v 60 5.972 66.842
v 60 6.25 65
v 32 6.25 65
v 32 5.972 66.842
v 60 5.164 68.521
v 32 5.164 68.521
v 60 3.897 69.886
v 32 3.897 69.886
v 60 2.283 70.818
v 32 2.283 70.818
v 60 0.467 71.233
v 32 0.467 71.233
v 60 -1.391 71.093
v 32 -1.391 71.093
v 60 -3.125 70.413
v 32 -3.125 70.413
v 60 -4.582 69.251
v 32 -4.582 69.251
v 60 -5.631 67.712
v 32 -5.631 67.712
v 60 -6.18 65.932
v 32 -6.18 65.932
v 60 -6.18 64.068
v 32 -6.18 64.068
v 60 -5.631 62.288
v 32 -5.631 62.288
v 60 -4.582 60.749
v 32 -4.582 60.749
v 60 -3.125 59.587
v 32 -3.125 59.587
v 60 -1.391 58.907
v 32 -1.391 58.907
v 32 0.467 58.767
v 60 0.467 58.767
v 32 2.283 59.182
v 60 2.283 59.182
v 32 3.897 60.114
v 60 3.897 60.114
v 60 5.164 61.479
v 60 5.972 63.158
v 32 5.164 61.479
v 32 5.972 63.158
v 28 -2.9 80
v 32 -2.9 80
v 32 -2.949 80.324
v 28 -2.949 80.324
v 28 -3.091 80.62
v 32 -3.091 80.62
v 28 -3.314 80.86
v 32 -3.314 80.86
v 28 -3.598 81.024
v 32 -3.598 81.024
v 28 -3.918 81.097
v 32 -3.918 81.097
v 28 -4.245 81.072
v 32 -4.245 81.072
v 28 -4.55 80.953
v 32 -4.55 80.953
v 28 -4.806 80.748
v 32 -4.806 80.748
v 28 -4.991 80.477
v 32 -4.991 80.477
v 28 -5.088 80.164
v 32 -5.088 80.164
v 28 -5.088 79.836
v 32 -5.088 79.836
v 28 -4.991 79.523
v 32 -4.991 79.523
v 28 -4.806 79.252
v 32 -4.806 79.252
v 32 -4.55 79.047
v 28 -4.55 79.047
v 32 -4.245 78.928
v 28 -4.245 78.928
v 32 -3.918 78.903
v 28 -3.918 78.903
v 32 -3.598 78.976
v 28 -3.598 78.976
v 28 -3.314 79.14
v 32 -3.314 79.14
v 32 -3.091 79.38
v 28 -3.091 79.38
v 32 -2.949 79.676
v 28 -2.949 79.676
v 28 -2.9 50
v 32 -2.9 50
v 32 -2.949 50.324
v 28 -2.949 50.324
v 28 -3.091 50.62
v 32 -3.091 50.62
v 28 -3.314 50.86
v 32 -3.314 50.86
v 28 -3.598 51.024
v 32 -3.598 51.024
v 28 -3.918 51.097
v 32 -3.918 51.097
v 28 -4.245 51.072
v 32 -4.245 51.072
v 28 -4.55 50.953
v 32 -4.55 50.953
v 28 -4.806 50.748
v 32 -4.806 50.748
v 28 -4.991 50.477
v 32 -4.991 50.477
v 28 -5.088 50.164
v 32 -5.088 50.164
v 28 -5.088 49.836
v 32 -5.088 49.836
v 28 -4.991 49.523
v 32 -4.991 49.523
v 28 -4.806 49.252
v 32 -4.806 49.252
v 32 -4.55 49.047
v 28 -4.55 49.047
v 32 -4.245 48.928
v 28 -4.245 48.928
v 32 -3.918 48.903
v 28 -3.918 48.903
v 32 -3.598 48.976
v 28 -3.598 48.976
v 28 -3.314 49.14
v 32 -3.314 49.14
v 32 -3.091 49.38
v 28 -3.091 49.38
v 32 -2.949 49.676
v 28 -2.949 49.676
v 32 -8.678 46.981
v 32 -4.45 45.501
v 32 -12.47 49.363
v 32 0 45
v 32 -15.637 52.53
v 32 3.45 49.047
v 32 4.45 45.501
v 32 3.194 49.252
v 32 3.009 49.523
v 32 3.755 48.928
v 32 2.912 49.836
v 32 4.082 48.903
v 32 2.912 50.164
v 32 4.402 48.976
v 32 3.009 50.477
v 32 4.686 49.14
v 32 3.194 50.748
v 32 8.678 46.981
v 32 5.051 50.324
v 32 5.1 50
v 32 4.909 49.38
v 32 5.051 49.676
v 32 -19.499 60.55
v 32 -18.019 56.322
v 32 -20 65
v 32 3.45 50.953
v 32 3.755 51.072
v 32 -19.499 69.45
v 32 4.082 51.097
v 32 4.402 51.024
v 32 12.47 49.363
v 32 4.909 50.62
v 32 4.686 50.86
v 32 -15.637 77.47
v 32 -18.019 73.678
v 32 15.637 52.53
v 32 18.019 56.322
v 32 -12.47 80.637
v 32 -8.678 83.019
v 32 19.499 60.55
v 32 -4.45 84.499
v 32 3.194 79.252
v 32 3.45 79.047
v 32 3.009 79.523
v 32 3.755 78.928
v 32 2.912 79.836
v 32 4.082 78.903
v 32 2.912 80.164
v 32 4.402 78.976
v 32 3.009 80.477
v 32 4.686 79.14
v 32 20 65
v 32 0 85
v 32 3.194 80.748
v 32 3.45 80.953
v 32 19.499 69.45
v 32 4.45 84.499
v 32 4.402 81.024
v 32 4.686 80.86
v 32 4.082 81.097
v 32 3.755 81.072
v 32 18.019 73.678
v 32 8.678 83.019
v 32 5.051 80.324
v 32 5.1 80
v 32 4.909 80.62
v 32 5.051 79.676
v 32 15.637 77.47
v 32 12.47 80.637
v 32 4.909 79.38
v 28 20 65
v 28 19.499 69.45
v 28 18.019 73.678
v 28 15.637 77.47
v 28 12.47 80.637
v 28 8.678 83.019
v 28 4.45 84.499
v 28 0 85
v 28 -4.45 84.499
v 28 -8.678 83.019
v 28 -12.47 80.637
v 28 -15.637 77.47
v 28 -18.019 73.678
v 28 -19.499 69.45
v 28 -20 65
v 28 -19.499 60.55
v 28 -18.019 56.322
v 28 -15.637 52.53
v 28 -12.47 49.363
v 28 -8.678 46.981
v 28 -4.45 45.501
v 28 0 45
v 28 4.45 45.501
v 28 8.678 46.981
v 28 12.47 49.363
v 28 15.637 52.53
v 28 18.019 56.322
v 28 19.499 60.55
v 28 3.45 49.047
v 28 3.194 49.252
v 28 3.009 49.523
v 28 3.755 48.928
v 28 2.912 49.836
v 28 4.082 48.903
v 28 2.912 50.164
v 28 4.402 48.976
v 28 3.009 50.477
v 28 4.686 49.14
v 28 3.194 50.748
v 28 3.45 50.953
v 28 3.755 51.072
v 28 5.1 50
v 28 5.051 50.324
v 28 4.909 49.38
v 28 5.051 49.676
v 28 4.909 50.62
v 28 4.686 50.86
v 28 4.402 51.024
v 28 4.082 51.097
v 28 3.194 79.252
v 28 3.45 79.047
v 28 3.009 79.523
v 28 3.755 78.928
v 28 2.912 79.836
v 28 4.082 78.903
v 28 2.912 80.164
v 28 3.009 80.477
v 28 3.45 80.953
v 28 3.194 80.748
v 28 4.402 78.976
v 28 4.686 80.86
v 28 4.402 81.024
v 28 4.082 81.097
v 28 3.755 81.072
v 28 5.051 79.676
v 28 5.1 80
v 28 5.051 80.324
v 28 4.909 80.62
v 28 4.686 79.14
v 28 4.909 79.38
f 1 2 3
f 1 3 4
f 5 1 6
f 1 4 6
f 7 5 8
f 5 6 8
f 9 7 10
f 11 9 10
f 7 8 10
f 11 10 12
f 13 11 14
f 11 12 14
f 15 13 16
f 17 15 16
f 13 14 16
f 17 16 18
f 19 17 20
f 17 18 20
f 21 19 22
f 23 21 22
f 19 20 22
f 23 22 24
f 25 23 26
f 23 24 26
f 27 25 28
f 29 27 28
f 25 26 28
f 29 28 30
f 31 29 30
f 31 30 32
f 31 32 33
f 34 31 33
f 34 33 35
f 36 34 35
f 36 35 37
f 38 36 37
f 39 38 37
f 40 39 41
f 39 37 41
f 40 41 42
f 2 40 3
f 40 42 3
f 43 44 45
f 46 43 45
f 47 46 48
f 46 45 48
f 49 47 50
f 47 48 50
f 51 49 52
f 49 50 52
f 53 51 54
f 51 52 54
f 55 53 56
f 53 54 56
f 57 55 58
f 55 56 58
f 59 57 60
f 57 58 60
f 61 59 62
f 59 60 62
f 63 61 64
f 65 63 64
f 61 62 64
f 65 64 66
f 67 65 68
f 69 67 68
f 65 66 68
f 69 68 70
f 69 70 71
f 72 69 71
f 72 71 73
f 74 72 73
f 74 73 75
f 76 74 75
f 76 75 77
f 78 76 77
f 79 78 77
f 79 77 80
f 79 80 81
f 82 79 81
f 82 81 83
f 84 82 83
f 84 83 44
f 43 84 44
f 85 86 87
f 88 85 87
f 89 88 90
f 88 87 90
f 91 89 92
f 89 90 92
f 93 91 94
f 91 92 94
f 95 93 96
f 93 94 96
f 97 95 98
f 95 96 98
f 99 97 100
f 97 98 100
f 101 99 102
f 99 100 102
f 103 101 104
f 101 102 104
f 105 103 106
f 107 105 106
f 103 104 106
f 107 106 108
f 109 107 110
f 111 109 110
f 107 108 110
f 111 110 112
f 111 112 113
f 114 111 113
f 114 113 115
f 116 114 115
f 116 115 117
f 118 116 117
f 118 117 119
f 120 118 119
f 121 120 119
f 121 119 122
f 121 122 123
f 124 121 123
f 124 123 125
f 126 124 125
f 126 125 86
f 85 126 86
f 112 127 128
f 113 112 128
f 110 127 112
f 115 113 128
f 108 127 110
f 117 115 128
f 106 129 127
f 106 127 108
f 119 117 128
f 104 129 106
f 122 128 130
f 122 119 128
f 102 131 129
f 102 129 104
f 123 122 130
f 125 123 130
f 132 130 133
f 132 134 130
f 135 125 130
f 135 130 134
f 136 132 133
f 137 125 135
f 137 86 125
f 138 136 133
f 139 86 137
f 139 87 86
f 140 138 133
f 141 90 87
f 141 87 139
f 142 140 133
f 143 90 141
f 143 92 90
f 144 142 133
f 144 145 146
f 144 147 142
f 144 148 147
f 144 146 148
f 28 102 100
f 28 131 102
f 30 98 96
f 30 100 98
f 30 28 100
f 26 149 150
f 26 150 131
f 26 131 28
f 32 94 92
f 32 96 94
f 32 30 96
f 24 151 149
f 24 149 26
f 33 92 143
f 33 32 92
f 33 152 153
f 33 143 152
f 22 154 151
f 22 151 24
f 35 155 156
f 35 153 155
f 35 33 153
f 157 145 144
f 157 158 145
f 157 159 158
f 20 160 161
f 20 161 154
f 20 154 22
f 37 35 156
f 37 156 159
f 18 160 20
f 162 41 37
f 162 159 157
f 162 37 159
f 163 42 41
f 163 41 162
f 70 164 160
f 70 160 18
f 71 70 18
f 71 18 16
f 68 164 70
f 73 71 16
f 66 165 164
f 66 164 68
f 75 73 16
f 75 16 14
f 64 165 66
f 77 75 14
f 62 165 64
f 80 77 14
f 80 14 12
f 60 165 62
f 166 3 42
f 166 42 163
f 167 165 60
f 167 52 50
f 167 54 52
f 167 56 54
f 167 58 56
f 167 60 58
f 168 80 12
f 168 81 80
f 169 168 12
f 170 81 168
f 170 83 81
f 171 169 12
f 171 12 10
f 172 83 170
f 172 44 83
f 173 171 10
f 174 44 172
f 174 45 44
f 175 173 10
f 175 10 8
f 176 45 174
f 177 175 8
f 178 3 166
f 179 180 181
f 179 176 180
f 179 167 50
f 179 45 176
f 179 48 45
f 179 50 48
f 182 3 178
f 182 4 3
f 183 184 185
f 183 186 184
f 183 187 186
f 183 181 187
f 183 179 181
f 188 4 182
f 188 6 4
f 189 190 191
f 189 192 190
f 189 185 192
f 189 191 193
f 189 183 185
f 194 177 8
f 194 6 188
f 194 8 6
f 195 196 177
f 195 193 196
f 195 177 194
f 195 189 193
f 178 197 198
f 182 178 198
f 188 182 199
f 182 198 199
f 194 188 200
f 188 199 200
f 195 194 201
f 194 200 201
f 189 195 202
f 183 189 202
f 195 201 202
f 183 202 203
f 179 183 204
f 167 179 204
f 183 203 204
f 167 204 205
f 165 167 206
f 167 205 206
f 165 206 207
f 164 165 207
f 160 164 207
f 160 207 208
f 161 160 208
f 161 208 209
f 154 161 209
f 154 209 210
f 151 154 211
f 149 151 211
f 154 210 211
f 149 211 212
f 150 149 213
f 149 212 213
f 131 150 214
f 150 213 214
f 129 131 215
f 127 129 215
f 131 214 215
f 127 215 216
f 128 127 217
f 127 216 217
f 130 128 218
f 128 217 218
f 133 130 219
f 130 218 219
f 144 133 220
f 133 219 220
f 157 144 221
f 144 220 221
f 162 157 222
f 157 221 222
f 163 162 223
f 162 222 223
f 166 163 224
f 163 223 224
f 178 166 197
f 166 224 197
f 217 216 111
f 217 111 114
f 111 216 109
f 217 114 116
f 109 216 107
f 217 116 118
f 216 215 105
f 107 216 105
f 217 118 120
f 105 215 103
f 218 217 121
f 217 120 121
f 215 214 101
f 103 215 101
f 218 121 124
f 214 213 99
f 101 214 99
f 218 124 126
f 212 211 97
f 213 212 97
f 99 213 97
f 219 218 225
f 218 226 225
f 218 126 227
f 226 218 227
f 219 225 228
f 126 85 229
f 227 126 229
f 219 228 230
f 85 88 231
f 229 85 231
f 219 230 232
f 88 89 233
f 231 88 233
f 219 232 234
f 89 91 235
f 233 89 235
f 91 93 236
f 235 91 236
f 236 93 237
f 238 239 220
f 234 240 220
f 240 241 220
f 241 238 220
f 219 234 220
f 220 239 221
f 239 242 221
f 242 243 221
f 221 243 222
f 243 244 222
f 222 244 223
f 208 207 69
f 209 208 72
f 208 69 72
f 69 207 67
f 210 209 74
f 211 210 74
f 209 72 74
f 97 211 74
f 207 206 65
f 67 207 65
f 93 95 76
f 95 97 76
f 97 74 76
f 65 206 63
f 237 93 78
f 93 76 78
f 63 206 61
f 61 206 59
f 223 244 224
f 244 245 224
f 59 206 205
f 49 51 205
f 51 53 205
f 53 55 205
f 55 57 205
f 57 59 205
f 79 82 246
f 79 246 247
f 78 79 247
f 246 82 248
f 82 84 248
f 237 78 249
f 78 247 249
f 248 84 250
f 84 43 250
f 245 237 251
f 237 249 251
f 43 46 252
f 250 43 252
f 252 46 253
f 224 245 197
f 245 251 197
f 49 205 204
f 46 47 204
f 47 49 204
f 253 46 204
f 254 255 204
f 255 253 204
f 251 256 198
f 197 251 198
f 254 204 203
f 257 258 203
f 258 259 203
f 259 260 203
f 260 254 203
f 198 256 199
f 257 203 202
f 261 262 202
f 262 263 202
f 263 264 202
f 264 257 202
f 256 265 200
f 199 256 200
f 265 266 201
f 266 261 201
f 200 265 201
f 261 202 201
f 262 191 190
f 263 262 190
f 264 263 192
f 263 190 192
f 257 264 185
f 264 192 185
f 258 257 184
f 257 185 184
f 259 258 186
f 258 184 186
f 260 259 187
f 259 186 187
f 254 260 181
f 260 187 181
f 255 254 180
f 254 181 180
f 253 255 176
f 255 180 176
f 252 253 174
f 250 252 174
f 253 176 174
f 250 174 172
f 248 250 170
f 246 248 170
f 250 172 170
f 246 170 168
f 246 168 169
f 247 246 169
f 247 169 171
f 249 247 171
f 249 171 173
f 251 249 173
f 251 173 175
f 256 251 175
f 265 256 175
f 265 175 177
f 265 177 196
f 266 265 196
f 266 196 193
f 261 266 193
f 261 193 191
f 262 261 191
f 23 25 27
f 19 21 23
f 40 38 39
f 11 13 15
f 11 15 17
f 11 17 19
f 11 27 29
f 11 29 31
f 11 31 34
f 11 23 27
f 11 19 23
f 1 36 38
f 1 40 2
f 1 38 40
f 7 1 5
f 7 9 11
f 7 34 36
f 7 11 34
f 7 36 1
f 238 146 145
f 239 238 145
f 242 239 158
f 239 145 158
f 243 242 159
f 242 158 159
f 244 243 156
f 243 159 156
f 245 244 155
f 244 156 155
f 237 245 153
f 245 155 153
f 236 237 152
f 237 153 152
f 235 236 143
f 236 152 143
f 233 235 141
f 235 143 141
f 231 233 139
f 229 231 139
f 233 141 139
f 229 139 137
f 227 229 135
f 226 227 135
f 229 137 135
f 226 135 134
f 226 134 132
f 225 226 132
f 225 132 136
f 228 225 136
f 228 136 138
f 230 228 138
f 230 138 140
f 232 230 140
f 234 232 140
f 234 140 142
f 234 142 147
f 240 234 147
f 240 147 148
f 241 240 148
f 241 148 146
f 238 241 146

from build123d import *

# Parameters (mm, degrees)
SKETCH023_R     = 20
PAD008_DEPTH    = 4
SKETCH024_R     = 1.1
POCKET008_DEPTH = 5
SKETCH025_R     = 6.25
PAD009_DEPTH    = 28


with BuildPart() as part:
    # Sketch023 → Pad008 (new body)
    with BuildSketch(Plane.YZ):
        Circle(SKETCH023_R)
    extrude(amount=PAD008_DEPTH)

    # Sketch024 (on Face3 of Pad008) → Pocket008 (cut)
    with BuildSketch(Plane.YZ.offset(4)):
        with Locations((-4, 15)):
            Circle(SKETCH024_R)
        with Locations((4, 15)):
            Circle(SKETCH024_R)
        with Locations((-4, -15)):
            Circle(SKETCH024_R)
        with Locations((4, -15)):
            Circle(SKETCH024_R)
    extrude(amount=-POCKET008_DEPTH, mode=Mode.SUBTRACT)

    # Sketch025 (on Face3 of Pocket008) → Pad009 (join)
    with BuildSketch(Plane.YZ.offset(4)):
        Circle(SKETCH025_R)
    extrude(amount=PAD009_DEPTH)


with BuildPart() as part_1:
    # Body003 placement: moved
    add(part.part.moved(Location((28, 0, 65))))


solid = part_1.part
